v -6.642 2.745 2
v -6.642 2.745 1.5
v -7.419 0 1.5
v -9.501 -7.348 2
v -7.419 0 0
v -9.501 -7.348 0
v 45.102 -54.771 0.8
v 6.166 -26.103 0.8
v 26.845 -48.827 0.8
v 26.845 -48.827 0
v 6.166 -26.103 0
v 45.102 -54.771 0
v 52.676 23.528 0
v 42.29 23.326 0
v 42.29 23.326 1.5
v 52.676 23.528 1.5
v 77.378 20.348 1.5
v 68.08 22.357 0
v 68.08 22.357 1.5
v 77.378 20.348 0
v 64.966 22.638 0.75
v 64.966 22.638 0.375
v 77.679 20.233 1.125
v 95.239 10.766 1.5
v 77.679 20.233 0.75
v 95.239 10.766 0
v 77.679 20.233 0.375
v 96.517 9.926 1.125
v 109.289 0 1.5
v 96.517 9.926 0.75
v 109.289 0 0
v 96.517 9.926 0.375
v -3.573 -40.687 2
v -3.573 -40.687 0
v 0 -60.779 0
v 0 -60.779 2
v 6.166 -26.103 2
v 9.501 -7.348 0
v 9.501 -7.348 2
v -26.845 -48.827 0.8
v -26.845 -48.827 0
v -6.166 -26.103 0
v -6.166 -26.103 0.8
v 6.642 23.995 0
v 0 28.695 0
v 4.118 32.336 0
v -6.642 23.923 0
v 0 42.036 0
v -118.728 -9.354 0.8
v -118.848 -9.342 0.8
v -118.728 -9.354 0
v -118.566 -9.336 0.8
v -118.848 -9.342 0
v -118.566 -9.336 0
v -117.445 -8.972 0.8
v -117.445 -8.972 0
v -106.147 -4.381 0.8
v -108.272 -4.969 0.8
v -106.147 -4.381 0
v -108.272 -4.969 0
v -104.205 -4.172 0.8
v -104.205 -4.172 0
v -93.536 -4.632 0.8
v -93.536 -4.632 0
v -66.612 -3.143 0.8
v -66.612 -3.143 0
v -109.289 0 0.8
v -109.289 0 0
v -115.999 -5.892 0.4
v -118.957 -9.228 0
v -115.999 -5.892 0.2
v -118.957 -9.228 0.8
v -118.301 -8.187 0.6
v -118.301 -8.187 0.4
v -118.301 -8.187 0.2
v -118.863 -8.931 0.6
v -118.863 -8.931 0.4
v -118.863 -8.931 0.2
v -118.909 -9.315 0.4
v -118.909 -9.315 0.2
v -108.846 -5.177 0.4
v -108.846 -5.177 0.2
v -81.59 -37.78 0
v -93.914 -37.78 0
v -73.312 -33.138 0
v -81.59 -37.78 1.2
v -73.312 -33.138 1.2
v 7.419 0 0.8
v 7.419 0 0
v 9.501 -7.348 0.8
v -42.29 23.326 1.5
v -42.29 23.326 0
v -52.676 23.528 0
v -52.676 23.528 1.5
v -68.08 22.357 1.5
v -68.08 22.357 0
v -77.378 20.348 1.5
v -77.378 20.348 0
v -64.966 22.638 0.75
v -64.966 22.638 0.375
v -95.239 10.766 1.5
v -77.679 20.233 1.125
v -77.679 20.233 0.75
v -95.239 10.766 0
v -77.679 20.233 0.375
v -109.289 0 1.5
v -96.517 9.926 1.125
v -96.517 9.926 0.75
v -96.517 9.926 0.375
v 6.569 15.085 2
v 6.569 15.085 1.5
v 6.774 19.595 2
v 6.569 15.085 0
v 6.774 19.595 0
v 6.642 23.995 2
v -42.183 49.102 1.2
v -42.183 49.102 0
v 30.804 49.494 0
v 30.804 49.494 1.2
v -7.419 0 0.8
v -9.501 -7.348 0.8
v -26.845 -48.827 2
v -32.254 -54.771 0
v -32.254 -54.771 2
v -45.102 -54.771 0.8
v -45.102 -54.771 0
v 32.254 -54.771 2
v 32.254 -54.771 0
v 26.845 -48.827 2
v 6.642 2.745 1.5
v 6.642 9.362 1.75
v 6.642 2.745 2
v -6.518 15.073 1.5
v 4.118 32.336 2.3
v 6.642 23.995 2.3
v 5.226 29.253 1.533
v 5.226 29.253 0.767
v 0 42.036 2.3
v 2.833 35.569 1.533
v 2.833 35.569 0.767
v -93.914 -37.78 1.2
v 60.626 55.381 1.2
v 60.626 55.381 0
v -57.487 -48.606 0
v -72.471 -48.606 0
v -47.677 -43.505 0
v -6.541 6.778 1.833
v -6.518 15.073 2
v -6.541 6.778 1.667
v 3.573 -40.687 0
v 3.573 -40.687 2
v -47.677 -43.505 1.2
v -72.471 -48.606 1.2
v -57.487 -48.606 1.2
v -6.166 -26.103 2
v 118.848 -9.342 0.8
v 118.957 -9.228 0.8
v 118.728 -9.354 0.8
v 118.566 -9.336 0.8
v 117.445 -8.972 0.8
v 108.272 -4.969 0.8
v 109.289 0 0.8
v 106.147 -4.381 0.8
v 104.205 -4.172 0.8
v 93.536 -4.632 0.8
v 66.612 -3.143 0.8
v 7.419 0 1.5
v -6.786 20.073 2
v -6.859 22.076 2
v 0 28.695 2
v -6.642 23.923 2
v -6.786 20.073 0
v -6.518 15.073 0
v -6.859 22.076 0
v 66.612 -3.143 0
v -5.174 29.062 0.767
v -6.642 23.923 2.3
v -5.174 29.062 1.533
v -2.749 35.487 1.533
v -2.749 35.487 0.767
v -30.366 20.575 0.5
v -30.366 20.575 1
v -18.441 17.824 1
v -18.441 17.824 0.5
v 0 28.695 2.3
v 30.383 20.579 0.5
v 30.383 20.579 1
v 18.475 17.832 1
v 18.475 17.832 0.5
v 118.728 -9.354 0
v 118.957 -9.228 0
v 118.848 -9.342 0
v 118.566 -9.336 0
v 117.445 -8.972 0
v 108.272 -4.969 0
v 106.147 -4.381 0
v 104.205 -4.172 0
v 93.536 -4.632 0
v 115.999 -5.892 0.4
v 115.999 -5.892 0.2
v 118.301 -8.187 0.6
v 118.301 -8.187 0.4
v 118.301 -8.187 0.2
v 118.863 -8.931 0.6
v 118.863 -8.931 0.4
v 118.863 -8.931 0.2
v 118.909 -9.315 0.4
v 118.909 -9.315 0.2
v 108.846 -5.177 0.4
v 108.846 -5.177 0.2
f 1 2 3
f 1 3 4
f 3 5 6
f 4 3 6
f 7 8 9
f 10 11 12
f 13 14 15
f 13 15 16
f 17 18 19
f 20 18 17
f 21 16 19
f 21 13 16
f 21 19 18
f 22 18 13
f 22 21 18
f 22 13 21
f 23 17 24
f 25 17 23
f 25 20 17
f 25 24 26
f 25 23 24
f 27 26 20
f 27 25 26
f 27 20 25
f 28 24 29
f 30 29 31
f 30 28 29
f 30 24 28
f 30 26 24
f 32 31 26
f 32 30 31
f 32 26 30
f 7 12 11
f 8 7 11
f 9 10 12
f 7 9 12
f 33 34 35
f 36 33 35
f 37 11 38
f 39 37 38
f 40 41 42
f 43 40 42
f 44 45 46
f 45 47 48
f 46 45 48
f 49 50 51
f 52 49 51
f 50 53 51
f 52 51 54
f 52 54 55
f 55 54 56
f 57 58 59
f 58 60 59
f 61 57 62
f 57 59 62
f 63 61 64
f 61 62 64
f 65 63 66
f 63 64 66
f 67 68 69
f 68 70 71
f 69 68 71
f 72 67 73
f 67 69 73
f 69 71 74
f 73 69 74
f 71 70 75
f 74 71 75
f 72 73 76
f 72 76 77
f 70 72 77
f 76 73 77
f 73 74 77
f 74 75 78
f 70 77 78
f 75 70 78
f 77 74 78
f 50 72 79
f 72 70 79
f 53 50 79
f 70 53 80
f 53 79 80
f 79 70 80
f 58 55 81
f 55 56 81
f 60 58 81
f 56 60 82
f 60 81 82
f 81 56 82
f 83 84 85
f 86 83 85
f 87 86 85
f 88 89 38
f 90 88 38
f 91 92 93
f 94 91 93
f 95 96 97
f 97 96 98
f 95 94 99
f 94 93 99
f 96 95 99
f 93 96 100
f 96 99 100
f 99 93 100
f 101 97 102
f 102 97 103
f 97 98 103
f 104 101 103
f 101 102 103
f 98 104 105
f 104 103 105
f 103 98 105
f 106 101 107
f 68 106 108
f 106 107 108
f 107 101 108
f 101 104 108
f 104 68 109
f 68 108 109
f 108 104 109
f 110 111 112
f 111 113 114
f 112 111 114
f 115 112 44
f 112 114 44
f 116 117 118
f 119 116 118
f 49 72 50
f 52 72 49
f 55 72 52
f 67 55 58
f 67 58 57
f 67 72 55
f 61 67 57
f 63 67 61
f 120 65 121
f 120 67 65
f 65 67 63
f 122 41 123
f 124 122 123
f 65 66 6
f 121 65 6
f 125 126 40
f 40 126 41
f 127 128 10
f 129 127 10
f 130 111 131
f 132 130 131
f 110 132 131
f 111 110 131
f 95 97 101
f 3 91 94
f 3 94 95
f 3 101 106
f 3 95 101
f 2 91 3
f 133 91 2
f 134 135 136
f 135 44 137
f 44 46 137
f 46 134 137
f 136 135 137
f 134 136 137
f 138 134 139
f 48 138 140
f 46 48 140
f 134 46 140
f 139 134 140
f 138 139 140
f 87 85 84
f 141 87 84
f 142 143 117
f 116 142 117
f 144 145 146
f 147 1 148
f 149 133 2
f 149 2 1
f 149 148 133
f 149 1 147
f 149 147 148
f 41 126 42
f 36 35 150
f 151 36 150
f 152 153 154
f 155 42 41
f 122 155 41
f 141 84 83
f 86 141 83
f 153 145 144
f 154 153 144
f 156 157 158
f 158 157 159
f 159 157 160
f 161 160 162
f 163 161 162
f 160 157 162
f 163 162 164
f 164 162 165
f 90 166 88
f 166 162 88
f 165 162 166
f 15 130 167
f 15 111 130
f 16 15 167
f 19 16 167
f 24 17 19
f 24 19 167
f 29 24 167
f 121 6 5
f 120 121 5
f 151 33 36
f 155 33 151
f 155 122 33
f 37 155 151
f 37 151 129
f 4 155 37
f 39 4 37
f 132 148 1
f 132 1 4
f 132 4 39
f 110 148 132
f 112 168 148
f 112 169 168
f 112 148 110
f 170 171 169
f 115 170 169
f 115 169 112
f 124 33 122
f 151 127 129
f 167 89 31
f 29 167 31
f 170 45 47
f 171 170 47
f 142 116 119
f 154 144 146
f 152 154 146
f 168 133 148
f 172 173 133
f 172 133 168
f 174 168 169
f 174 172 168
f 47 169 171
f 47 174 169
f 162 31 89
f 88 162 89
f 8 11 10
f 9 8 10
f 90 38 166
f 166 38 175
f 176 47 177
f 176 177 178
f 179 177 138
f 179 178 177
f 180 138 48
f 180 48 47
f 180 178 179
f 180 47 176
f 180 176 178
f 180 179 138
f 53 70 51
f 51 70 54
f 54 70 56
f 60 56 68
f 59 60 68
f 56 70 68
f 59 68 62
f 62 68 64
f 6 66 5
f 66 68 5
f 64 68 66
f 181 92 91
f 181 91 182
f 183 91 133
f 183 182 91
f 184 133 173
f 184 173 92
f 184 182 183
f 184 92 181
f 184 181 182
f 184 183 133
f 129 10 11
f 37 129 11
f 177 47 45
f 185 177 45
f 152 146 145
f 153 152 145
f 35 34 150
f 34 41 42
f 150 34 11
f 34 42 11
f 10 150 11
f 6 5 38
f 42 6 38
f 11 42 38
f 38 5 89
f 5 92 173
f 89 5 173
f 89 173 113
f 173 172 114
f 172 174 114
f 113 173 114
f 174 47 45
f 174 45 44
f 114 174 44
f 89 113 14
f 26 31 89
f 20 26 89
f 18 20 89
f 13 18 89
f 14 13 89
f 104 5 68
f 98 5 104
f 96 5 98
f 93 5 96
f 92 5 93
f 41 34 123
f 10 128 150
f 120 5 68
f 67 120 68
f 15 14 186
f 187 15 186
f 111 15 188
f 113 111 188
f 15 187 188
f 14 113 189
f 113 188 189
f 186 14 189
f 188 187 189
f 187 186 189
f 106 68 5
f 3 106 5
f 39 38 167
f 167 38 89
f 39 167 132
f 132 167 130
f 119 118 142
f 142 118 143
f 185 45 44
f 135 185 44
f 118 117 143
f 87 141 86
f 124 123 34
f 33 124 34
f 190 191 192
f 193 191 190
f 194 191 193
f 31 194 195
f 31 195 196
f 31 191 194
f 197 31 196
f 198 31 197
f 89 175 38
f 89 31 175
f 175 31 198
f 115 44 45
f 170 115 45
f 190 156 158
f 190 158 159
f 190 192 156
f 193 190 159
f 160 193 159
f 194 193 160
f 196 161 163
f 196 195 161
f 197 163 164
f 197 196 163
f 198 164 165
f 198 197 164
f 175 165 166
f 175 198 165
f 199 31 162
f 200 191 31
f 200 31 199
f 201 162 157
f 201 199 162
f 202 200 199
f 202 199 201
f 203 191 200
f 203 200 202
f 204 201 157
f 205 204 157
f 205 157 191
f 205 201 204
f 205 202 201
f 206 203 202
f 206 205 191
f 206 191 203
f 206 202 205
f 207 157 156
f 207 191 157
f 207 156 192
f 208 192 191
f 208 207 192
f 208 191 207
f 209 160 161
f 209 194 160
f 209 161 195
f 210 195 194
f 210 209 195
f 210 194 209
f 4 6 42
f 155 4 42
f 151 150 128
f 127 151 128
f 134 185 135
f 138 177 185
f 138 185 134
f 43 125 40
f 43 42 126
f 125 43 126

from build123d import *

# Parameters (mm, degrees)
F1_DEPTH = 2
F2_DEPTH = 2.3
F3_DEPTH = 1.5
F4_DEPTH = 0.8
F5_DEPTH = 1.2


# Not quite as in the source:
# - a feature names something its author has since deleted; it is built from what else it names


with BuildPart() as f1:
    # F0 (on Top) → F1 (new body)
    with BuildSketch(Plane.XY):
        with BuildLine():
            Line((-6.6419716499, 2.745028284), (0, 0))
            Line((0, 0), (0, 28.6946911365))
            Line((0, 28.6946911365), (-6.6419716499, 23.9225961235))
            add(Edge.make_bspline(
                [(-6.5175706139, 15.0729201773), (-6.5414876506, 16.2812130784), (-6.6806623081, 20.0881688925), (-7.0635559844, 21.7026716796), (-6.6419716499, 23.9225961235)],
                knots=[0.2785134471, 0.2785134471, 0.2785134471, 0.2785134471, 0.3682433903, 0.5898063865, 0.5898063865, 0.5898063865, 0.5898063865], degree=3))
            add(Edge.make_bspline(
                [(-6.6419716499, 2.745028284), (-6.5251722943, 6.5032297687), (-6.4433343436, 11.3224907311), (-6.5175706139, 15.0729201773)],
                knots=[0, 0, 0, 0, 0.2785134471, 0.2785134471, 0.2785134471, 0.2785134471], degree=3))
        make_face()
        with BuildLine():
            Line((0, 28.6946911365), (0, 0))
            Line((0, 0), (6.6419716499, 2.745028284))
            add(Edge.make_bspline(
                [(6.6419716499, 2.745028284), (6.6625704877, 4.4259580865), (6.6879671442, 8.5489520633), (6.5628964948, 13.2490139748), (6.5686901265, 15.0847156957)],
                knots=[0, 0, 0, 0, 0.2083076988, 0.3619822263, 0.3619822263, 0.3619822263, 0.3619822263], degree=3))
            add(Edge.make_bspline(
                [(6.5686901265, 15.0847156957), (6.5717947616, 16.0684137089), (6.6405692543, 19.2909426976), (7.065262223, 21.4932328604), (6.6419716499, 23.9949107423)],
                knots=[0.3619822263, 0.3619822263, 0.3619822263, 0.3619822263, 0.4443318399, 0.644940685, 0.644940685, 0.644940685, 0.644940685], degree=3))
            Line((6.6419716499, 23.9949107423), (0, 28.6946911365))
        make_face()
        Polygon((9.5007317222, -7.3481148503), (0, -8.0477236517), (0, -38.9328375459), (3.5725845946, -40.6871710497), (6.1658886261, -26.1027980596), align=None)
        Polygon((0, -38.9328375459), (0, -8.0477236517), (-9.5007317222, -7.3481148503), (-6.1658886261, -26.1027980596), (-3.5725845946, -40.6871710497), align=None)
        Polygon((-32.2535888602, -54.7711053479), (-3.5725845946, -40.6871710497), (-6.1658886261, -26.1027980596), (-26.8448407595, -48.8273214495), align=None)
        Polygon((26.8448407595, -48.8273214495), (6.1658886261, -26.1027980596), (3.5725845946, -40.6871710497), (32.2535888602, -54.7711053479), align=None)
        Polygon((0, -8.0477236517), (0, 0), (-7.4194675351, 0), (-9.5007317222, -7.3481148503), align=None)
        Polygon((7.4194675351, 0), (0, 0), (0, -8.0477236517), (9.5007317222, -7.3481148503), align=None)
        Polygon((6.6419716499, 2.745028284), (0, 0), (7.4194675351, 0), align=None)
        Polygon((-7.4194675351, 0), (0, 0), (-6.6419716499, 2.745028284), align=None)
        Polygon((3.5725845946, -40.6871710497), (0, -38.9328375459), (-3.5725845946, -40.6871710497), (0, -60.7788786292), align=None)
    extrude(amount=F1_DEPTH)

    # F0 (on Top) → F3 (join)
    with BuildSketch(Plane.XY):
        with BuildLine():
            Line((6.6419716499, 2.745028284), (7.4194675351, 0))
            Line((7.4194675351, 0), (109.2885956168, 0))
            add(Edge.make_bspline(
                [(42.290057987, 23.3256332576), (46.9602869466, 24.1669337854), (66.2240272129, 22.5460111833), (77.2780101126, 21.5519474786), (97.7039953696, 9.7181396105), (104.4322660293, 4.1460579818), (109.2885956168, 0)],
                knots=[0, 0, 0, 0, 0.1453308986, 0.2550811327, 0.396472964, 0.5191870129, 0.5191870129, 0.5191870129, 0.5191870129], degree=3))
            add(Edge.make_bspline(
                [(42.290057987, 23.3256332576), (30.384955122, 20.5786005266), (18.4738102627, 17.8317479119), (6.5686901266, 15.0847156956)],
                knots=[0, 0, 0, 0, 36.6596267337, 36.6596267337, 36.6596267337, 36.6596267337], degree=3))
            add(Edge.make_bspline(
                [(6.6419716499, 2.745028284), (6.6625704877, 4.4259580865), (6.6879671442, 8.5489520633), (6.5628964948, 13.2490139748), (6.5686901265, 15.0847156957)],
                knots=[0, 0, 0, 0, 0.2083076988, 0.3619822263, 0.3619822263, 0.3619822263, 0.3619822263], degree=3))
        make_face()
        with BuildLine():
            Line((-109.2885956168, 0), (-7.4194675351, 0))
            Line((-7.4194675351, 0), (-6.6419716499, 2.745028284))
            add(Edge.make_bspline(
                [(-6.6419716499, 2.745028284), (-6.5251722943, 6.5032297687), (-6.4433343436, 11.3224907311), (-6.5175706139, 15.0729201773)],
                knots=[0, 0, 0, 0, 0.2785134471, 0.2785134471, 0.2785134471, 0.2785134471], degree=3))
            add(Edge.make_bspline(
                [(-42.290057987, 23.3256332576), (-30.3679152969, 20.5746686867), (-18.4397133041, 17.8238847482), (-6.5175706139, 15.0729201773)],
                knots=[0, 0, 0, 0, 36.7120978158, 36.7120978158, 36.7120978158, 36.7120978158], degree=3))
            add(Edge.make_bspline(
                [(-42.290057987, 23.3256332576), (-46.9602869466, 24.1669337854), (-66.2240272129, 22.5460111833), (-77.2780101126, 21.5519474786), (-97.7039953696, 9.7181396105), (-104.4322660293, 4.1460579818), (-109.2885956168, 0)],
                knots=[0, 0, 0, 0, 0.1453308986, 0.2550811327, 0.396472964, 0.5191870129, 0.5191870129, 0.5191870129, 0.5191870129], degree=3))
        make_face()
    extrude(amount=F3_DEPTH)


with BuildPart() as f2:
    # F0 (on Top) → F2 (new body)
    with BuildSketch(Plane.XY):
        with BuildLine():
            Line((-6.6419716499, 23.9225961235), (0, 28.6946911365))
            Line((0, 28.6946911365), (6.6419716499, 23.9949107423))
            add(Edge.make_bspline(
                [(6.6419716499, 23.9949107423), (5.892786035, 28.4226518758), (2.8744096347, 35.7960231207), (0, 42.0363731682)],
                knots=[0.644940685, 0.644940685, 0.644940685, 0.644940685, 1, 1, 1, 1], degree=3))
            add(Edge.make_bspline(
                [(-6.6419716499, 23.9225961235), (-5.8614658592, 28.032482904), (-2.70186861, 35.812589021), (0, 42.0363731682)],
                knots=[0.5898063865, 0.5898063865, 0.5898063865, 0.5898063865, 1, 1, 1, 1], degree=3))
        make_face()
    extrude(amount=F2_DEPTH)


with BuildPart() as f4:
    # F0 (on Top) → F4 (new body)
    with BuildSketch(Plane.XY):
        with BuildLine():
            Line((-66.6123788172, -3.1425639369), (-109.2885956168, 0))
            add(Edge.make_bspline(
                [(-109.2885956168, 0), (-113.7072309048, -3.7723794842), (-125.0662078985, -13.5985728633), (-106.5027266596, -3.0910792348), (-99.4689310801, -5.3383077024), (-79.0510181663, -4.1965041845), (-66.6123788172, -3.1425639369)],
                knots=[0.5191870129, 0.5191870129, 0.5191870129, 0.5191870129, 0.6308410134, 0.7359516151, 0.8254118404, 1, 1, 1, 1], degree=3))
        make_face()
        Polygon((-9.5007317222, -7.3481148503), (-7.4194675351, 0), (-109.2885956168, 0), (-66.6123788172, -3.1425639369), align=None)
    extrude(amount=F4_DEPTH)


with BuildPart() as f4b:
    # F0 (on Top) → F4, piece 2 (new body)
    with BuildSketch(Plane.XY):
        with BuildLine():
            add(Edge.make_bspline(
                [(109.2885956168, 0), (113.7072309048, -3.7723794842), (125.0662078985, -13.5985728633), (106.5027266596, -3.0910792348), (99.4689310801, -5.3383077024), (79.0510181663, -4.1965041845), (66.6123788172, -3.1425639369)],
                knots=[0.5191870129, 0.5191870129, 0.5191870129, 0.5191870129, 0.6308410134, 0.7359516151, 0.8254118404, 1, 1, 1, 1], degree=3))
            Line((109.2885956168, 0), (66.6123788172, -3.1425639369))
        make_face()
        Polygon((109.2885956168, 0), (7.4194675351, 0), (9.5007317222, -7.3481148503), (66.6123788172, -3.1425639369), align=None)
    extrude(amount=F4_DEPTH)


with BuildPart() as f4c:
    # F0 (on Top) → F4, piece 3 (new body)
    with BuildSketch(Plane.XY):
        Polygon((-26.8448407595, -48.8273214495), (-6.1658886261, -26.1027980596), (-45.1018763415, -54.7711053479), align=None)
    extrude(amount=F4_DEPTH)


with BuildPart() as f4d:
    # F0 (on Top) → F4, piece 4 (new body)
    with BuildSketch(Plane.XY):
        Polygon((45.1018763415, -54.7711053479), (6.1658886261, -26.1027980596), (26.8448407595, -48.8273214495), align=None)
    extrude(amount=F4_DEPTH)


with BuildPart() as f5:
    # F0 (on Top) → F5 (new body)
    with BuildSketch(Plane.XY):
        Polygon((-73.3117833734, -33.1380404532), (-93.9138201779, -37.7803705633), (-81.5899297595, -37.7803705633), align=None)
    extrude(amount=F5_DEPTH)


with BuildPart() as f5b:
    # F0 (on Top) → F5, piece 2 (new body)
    with BuildSketch(Plane.XY):
        Polygon((60.6261715293, 55.3805120289), (-42.1832613647, 49.102075398), (30.8035947382, 49.4944788516), align=None)
    extrude(amount=F5_DEPTH)


with BuildPart() as f5c:
    # F0 (on Top) → F5, piece 3 (new body)
    with BuildSketch(Plane.XY):
        Polygon((-47.6768948138, -43.504897505), (-72.4707837196, -48.6061275005), (-57.4869550765, -48.6061275005), align=None)
    extrude(amount=F5_DEPTH)


solid = Compound([f1.part, f2.part, f4.part, f4b.part, f4c.part, f4d.part, f5.part, f5b.part, f5c.part])
